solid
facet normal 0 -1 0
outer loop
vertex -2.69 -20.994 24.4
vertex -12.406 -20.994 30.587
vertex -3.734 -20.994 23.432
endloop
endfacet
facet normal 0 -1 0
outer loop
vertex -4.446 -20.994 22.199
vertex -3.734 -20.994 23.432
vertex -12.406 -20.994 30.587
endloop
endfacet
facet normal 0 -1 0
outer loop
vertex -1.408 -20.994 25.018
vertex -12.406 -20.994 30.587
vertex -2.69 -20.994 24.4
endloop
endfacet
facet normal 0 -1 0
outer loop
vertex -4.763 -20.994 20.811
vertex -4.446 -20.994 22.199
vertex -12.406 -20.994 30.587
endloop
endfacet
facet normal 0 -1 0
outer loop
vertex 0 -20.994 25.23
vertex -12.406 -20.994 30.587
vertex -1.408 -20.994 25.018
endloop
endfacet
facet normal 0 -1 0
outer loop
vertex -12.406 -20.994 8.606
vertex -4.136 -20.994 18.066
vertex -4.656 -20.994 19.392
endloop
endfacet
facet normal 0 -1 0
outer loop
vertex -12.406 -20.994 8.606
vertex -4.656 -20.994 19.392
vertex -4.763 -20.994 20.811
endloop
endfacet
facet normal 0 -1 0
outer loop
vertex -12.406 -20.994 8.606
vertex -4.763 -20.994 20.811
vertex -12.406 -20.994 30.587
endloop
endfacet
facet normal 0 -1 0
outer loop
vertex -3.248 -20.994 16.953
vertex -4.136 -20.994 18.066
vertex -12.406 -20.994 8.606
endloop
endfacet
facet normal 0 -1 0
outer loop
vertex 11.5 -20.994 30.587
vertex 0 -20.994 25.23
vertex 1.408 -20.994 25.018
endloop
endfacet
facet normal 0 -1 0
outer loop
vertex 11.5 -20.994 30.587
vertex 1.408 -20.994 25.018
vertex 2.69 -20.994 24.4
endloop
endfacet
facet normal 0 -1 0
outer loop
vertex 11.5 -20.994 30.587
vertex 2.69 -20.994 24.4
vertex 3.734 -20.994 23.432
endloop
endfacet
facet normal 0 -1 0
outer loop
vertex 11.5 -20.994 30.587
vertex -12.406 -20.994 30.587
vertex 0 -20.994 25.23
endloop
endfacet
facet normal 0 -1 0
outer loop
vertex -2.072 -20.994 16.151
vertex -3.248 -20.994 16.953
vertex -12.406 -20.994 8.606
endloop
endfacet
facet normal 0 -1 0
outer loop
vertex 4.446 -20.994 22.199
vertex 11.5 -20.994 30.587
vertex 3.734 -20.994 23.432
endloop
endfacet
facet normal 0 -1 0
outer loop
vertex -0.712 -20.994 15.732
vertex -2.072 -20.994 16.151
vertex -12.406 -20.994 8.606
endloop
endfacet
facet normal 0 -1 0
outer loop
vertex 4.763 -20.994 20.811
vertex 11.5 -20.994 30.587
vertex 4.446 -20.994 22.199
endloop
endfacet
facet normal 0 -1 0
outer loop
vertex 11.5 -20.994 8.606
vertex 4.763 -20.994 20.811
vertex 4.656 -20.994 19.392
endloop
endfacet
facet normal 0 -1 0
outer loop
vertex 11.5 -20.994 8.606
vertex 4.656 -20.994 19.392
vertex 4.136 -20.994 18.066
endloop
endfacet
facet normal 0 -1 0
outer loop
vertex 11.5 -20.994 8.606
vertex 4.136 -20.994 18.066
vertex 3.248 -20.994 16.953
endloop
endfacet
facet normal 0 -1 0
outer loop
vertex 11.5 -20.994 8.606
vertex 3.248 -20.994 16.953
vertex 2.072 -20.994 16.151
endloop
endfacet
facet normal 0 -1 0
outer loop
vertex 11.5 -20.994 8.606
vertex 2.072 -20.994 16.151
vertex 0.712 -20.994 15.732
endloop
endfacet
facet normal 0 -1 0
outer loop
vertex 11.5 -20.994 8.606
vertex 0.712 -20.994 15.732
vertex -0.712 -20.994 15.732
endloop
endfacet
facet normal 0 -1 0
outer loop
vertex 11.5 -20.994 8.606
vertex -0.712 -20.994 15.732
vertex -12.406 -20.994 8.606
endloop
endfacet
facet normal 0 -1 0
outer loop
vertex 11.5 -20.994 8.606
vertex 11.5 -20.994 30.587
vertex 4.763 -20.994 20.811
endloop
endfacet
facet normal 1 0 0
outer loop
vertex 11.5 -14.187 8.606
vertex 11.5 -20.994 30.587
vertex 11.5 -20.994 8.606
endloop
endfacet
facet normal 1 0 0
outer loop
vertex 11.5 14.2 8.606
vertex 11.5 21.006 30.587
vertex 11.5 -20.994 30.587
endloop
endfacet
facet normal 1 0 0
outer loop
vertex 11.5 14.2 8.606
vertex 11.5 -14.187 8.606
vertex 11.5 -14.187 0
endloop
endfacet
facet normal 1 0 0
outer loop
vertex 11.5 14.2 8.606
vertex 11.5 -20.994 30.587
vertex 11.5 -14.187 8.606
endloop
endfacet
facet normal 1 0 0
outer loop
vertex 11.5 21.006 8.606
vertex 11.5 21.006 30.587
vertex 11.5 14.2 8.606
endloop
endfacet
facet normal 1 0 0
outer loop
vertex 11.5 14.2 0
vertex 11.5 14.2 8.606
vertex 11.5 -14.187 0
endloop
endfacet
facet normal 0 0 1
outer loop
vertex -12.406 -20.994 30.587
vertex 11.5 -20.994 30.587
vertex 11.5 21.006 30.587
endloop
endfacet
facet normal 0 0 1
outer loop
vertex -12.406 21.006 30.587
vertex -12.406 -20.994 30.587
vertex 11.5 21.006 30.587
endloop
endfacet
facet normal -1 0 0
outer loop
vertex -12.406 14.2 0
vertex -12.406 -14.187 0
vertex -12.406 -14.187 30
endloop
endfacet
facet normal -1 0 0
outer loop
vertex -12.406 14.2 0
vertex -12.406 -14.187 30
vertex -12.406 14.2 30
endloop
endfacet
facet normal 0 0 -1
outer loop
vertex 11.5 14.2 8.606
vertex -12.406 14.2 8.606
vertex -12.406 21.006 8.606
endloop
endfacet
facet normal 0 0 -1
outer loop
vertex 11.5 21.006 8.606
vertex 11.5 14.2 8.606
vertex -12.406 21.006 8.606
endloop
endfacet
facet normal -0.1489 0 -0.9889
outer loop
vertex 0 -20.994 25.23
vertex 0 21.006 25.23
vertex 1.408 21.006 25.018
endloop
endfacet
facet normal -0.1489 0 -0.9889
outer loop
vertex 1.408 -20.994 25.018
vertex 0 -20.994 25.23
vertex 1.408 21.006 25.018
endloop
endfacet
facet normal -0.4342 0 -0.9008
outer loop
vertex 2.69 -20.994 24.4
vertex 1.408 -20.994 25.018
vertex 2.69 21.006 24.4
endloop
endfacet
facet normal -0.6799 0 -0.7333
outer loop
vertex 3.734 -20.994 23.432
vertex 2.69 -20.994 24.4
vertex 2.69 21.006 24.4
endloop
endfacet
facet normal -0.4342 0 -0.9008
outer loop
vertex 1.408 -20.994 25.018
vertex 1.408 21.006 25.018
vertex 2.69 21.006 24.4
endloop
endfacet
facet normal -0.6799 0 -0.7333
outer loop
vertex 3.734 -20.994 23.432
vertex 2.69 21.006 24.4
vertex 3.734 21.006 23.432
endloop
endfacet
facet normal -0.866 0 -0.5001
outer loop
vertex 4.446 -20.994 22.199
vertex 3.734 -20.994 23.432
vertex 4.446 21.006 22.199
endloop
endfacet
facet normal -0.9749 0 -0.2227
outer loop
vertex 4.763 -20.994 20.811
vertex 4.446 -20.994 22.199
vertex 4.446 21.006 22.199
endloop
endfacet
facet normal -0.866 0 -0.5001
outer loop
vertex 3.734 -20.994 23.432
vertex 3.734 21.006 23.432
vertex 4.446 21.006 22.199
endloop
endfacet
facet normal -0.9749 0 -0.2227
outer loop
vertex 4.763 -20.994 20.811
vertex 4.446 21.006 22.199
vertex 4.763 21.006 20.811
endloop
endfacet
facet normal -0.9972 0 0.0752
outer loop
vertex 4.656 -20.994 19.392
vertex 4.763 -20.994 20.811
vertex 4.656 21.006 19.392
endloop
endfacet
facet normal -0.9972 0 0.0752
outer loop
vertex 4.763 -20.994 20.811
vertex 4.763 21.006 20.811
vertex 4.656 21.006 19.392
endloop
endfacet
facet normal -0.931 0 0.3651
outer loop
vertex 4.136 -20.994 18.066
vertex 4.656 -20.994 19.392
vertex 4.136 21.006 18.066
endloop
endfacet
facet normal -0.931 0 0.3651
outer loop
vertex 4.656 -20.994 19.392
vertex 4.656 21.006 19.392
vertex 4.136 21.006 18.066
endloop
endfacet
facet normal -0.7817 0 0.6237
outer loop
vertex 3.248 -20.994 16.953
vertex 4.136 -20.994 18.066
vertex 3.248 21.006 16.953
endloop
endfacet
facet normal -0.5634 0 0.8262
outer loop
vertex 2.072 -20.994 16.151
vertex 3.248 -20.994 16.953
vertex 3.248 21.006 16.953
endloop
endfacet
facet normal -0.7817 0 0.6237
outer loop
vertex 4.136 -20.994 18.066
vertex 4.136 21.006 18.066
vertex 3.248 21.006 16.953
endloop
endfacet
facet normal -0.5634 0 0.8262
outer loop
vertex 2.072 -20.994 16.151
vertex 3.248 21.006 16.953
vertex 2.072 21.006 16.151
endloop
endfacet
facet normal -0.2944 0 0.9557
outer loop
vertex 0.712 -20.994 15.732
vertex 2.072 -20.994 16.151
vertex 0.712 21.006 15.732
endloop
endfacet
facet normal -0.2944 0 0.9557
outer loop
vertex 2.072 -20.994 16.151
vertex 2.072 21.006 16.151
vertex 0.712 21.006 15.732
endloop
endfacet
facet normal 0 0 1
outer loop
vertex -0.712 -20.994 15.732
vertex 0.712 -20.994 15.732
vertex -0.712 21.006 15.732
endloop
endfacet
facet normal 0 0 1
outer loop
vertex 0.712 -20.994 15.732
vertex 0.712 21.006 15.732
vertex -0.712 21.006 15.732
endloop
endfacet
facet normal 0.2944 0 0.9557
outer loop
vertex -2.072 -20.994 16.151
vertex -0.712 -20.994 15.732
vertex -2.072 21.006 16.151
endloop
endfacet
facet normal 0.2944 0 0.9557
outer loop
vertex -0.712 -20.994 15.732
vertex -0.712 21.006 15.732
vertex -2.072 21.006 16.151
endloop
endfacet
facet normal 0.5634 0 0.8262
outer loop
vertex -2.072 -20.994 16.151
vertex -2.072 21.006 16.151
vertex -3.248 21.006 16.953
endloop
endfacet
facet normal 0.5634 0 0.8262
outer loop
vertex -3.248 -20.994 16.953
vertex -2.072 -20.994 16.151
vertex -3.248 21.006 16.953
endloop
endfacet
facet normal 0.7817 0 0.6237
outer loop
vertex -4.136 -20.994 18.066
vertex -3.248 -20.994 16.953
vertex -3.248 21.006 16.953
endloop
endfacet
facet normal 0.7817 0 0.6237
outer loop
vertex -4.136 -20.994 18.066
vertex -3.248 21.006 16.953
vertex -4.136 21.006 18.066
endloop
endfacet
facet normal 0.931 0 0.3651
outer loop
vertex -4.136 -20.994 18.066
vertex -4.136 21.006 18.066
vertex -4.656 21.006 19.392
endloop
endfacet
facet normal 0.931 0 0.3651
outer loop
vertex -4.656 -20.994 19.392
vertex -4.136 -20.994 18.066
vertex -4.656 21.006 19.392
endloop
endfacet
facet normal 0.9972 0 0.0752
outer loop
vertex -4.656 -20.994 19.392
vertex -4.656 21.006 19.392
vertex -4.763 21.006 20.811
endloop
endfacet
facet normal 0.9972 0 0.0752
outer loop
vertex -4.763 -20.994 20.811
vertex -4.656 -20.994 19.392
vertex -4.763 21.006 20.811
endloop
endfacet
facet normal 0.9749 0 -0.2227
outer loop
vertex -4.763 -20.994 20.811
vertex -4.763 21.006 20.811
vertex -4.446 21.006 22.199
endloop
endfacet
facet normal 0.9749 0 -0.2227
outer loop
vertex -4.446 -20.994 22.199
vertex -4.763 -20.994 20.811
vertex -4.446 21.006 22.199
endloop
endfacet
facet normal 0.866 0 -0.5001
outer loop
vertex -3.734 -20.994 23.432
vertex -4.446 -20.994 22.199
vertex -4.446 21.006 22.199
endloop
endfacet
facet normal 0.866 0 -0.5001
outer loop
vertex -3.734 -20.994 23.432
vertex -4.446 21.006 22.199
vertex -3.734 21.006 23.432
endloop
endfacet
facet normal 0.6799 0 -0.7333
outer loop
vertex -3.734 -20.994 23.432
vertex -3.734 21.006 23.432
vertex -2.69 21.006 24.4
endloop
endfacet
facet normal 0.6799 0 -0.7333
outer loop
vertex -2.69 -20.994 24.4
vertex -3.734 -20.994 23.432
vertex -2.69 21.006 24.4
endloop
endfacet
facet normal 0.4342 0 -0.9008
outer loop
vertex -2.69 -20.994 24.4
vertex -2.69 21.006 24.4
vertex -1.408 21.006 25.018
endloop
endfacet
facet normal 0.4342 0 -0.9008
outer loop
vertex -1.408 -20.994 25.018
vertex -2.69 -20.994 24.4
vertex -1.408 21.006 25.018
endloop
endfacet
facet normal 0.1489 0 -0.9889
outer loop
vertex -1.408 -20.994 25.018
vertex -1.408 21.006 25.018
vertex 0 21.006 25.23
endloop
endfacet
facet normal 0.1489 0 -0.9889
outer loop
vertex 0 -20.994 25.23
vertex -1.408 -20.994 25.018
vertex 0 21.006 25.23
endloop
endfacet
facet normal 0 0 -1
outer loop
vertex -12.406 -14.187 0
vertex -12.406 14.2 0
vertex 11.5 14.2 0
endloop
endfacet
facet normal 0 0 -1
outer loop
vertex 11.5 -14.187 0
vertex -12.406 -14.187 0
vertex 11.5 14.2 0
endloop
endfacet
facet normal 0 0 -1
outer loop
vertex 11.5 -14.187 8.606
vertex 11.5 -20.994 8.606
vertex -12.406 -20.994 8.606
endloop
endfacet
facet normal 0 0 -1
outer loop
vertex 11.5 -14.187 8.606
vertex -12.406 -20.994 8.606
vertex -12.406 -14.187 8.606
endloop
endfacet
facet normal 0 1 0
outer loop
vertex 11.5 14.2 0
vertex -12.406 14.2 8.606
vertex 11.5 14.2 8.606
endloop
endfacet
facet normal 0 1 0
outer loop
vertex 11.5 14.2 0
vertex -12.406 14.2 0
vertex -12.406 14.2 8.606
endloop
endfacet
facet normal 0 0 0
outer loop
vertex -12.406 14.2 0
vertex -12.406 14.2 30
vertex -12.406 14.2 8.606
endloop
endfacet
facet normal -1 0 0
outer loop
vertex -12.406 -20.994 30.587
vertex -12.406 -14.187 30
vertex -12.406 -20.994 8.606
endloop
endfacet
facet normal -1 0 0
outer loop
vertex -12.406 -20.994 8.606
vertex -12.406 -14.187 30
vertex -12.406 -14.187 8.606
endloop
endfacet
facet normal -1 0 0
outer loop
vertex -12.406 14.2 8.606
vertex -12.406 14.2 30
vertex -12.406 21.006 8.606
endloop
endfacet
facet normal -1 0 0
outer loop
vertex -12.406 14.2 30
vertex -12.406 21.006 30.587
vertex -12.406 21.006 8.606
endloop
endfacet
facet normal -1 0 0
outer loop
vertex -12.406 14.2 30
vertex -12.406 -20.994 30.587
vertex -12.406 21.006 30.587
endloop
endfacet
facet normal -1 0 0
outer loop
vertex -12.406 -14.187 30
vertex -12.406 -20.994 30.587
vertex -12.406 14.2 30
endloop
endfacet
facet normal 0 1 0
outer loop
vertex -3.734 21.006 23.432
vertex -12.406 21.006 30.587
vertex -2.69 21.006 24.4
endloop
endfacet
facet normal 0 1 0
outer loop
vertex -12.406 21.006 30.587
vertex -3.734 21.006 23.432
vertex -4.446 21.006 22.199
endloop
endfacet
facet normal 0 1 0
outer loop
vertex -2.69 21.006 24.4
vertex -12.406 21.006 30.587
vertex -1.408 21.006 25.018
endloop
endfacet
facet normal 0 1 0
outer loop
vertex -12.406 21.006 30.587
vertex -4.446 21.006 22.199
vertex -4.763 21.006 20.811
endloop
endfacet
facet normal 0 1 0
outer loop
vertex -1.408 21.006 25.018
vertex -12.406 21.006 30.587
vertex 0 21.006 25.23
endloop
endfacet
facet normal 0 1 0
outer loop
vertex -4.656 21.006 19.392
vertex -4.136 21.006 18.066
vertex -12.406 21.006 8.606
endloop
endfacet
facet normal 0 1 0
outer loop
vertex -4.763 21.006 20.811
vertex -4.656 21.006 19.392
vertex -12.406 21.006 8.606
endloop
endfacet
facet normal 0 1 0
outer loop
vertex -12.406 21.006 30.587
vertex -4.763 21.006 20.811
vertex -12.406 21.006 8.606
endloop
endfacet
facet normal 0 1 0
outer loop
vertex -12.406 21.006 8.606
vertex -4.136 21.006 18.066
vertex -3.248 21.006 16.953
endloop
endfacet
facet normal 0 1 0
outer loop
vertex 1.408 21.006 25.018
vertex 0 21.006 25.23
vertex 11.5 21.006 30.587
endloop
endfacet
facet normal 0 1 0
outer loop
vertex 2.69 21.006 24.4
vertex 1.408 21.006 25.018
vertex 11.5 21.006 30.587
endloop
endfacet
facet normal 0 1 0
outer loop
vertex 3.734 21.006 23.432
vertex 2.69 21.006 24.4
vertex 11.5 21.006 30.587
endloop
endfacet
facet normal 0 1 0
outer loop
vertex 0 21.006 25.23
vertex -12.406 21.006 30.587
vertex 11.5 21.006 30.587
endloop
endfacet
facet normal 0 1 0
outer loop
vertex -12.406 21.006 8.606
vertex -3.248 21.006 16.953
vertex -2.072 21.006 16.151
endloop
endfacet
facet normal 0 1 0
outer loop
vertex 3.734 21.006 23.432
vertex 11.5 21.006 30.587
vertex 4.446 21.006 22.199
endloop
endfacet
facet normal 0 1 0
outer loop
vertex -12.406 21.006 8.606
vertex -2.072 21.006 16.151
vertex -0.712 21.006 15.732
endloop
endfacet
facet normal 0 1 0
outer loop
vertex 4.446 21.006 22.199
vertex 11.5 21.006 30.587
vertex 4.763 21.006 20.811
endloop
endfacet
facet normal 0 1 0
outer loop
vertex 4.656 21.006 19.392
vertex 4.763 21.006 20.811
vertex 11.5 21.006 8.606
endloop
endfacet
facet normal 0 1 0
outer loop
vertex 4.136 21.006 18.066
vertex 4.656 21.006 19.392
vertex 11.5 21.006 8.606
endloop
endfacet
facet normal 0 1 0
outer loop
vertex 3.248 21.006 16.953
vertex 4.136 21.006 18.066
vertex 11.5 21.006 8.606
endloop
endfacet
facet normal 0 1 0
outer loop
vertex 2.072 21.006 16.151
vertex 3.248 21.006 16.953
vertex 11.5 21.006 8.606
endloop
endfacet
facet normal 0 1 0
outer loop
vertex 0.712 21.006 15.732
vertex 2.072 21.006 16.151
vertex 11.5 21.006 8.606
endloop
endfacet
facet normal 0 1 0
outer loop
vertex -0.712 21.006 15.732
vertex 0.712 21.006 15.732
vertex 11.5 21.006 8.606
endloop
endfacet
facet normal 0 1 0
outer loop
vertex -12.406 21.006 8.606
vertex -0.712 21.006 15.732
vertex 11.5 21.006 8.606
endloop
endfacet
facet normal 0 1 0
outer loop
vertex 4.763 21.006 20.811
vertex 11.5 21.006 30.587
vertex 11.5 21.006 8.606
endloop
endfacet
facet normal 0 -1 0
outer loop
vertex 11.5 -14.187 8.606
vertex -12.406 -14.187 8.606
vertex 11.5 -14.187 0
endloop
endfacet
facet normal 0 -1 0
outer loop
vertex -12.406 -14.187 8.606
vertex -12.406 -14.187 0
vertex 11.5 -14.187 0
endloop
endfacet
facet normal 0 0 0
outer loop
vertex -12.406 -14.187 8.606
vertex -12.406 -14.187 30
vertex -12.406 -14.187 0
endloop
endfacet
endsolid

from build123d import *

# Parameters (mm, degrees)
SKETCH1_W           = 23.905693463
SKETCH1_H           = 28.387398435
BOSS_EXTRUDE1_DEPTH = 30
SKETCH3_W           = 21.980836904
SKETCH3_H           = 42
BOSS_EXTRUDE2_DEPTH = 23.905693
SKETCH2_R           = 4.775946378
CUT_EXTRUDE1_DEPTH  = 54.417670701


with BuildPart() as part:
    # Sketch1 → Boss-Extrude1 (new body)
    with BuildSketch(Plane.XY):
        with Locations((-0.452846732, 0.006300783)):
            Rectangle(SKETCH1_W, SKETCH1_H)
    extrude(amount=BOSS_EXTRUDE1_DEPTH)

    # Sketch3 → Boss-Extrude2 (add, through all)
    with BuildSketch(Plane(origin=(11.5, 0, 0), x_dir=(0, 0, -1), z_dir=(1, 0, 0))):
        with Locations((-19.596283116, 0.006300783)):
            Rectangle(SKETCH3_W, SKETCH3_H)
    extrude(amount=-BOSS_EXTRUDE2_DEPTH)

    # Sketch2 → Cut-Extrude1 (cut, through all)
    with BuildSketch(Plane(origin=(0, 21.006300783, 0), x_dir=(1, 0, 0), z_dir=(0, 1, 0))):
        with Locations(Location((0, -20.454249212, 0), (0, 0, 270))):
            Circle(SKETCH2_R)
    extrude(amount=-CUT_EXTRUDE1_DEPTH, mode=Mode.SUBTRACT)


solid = part.part
